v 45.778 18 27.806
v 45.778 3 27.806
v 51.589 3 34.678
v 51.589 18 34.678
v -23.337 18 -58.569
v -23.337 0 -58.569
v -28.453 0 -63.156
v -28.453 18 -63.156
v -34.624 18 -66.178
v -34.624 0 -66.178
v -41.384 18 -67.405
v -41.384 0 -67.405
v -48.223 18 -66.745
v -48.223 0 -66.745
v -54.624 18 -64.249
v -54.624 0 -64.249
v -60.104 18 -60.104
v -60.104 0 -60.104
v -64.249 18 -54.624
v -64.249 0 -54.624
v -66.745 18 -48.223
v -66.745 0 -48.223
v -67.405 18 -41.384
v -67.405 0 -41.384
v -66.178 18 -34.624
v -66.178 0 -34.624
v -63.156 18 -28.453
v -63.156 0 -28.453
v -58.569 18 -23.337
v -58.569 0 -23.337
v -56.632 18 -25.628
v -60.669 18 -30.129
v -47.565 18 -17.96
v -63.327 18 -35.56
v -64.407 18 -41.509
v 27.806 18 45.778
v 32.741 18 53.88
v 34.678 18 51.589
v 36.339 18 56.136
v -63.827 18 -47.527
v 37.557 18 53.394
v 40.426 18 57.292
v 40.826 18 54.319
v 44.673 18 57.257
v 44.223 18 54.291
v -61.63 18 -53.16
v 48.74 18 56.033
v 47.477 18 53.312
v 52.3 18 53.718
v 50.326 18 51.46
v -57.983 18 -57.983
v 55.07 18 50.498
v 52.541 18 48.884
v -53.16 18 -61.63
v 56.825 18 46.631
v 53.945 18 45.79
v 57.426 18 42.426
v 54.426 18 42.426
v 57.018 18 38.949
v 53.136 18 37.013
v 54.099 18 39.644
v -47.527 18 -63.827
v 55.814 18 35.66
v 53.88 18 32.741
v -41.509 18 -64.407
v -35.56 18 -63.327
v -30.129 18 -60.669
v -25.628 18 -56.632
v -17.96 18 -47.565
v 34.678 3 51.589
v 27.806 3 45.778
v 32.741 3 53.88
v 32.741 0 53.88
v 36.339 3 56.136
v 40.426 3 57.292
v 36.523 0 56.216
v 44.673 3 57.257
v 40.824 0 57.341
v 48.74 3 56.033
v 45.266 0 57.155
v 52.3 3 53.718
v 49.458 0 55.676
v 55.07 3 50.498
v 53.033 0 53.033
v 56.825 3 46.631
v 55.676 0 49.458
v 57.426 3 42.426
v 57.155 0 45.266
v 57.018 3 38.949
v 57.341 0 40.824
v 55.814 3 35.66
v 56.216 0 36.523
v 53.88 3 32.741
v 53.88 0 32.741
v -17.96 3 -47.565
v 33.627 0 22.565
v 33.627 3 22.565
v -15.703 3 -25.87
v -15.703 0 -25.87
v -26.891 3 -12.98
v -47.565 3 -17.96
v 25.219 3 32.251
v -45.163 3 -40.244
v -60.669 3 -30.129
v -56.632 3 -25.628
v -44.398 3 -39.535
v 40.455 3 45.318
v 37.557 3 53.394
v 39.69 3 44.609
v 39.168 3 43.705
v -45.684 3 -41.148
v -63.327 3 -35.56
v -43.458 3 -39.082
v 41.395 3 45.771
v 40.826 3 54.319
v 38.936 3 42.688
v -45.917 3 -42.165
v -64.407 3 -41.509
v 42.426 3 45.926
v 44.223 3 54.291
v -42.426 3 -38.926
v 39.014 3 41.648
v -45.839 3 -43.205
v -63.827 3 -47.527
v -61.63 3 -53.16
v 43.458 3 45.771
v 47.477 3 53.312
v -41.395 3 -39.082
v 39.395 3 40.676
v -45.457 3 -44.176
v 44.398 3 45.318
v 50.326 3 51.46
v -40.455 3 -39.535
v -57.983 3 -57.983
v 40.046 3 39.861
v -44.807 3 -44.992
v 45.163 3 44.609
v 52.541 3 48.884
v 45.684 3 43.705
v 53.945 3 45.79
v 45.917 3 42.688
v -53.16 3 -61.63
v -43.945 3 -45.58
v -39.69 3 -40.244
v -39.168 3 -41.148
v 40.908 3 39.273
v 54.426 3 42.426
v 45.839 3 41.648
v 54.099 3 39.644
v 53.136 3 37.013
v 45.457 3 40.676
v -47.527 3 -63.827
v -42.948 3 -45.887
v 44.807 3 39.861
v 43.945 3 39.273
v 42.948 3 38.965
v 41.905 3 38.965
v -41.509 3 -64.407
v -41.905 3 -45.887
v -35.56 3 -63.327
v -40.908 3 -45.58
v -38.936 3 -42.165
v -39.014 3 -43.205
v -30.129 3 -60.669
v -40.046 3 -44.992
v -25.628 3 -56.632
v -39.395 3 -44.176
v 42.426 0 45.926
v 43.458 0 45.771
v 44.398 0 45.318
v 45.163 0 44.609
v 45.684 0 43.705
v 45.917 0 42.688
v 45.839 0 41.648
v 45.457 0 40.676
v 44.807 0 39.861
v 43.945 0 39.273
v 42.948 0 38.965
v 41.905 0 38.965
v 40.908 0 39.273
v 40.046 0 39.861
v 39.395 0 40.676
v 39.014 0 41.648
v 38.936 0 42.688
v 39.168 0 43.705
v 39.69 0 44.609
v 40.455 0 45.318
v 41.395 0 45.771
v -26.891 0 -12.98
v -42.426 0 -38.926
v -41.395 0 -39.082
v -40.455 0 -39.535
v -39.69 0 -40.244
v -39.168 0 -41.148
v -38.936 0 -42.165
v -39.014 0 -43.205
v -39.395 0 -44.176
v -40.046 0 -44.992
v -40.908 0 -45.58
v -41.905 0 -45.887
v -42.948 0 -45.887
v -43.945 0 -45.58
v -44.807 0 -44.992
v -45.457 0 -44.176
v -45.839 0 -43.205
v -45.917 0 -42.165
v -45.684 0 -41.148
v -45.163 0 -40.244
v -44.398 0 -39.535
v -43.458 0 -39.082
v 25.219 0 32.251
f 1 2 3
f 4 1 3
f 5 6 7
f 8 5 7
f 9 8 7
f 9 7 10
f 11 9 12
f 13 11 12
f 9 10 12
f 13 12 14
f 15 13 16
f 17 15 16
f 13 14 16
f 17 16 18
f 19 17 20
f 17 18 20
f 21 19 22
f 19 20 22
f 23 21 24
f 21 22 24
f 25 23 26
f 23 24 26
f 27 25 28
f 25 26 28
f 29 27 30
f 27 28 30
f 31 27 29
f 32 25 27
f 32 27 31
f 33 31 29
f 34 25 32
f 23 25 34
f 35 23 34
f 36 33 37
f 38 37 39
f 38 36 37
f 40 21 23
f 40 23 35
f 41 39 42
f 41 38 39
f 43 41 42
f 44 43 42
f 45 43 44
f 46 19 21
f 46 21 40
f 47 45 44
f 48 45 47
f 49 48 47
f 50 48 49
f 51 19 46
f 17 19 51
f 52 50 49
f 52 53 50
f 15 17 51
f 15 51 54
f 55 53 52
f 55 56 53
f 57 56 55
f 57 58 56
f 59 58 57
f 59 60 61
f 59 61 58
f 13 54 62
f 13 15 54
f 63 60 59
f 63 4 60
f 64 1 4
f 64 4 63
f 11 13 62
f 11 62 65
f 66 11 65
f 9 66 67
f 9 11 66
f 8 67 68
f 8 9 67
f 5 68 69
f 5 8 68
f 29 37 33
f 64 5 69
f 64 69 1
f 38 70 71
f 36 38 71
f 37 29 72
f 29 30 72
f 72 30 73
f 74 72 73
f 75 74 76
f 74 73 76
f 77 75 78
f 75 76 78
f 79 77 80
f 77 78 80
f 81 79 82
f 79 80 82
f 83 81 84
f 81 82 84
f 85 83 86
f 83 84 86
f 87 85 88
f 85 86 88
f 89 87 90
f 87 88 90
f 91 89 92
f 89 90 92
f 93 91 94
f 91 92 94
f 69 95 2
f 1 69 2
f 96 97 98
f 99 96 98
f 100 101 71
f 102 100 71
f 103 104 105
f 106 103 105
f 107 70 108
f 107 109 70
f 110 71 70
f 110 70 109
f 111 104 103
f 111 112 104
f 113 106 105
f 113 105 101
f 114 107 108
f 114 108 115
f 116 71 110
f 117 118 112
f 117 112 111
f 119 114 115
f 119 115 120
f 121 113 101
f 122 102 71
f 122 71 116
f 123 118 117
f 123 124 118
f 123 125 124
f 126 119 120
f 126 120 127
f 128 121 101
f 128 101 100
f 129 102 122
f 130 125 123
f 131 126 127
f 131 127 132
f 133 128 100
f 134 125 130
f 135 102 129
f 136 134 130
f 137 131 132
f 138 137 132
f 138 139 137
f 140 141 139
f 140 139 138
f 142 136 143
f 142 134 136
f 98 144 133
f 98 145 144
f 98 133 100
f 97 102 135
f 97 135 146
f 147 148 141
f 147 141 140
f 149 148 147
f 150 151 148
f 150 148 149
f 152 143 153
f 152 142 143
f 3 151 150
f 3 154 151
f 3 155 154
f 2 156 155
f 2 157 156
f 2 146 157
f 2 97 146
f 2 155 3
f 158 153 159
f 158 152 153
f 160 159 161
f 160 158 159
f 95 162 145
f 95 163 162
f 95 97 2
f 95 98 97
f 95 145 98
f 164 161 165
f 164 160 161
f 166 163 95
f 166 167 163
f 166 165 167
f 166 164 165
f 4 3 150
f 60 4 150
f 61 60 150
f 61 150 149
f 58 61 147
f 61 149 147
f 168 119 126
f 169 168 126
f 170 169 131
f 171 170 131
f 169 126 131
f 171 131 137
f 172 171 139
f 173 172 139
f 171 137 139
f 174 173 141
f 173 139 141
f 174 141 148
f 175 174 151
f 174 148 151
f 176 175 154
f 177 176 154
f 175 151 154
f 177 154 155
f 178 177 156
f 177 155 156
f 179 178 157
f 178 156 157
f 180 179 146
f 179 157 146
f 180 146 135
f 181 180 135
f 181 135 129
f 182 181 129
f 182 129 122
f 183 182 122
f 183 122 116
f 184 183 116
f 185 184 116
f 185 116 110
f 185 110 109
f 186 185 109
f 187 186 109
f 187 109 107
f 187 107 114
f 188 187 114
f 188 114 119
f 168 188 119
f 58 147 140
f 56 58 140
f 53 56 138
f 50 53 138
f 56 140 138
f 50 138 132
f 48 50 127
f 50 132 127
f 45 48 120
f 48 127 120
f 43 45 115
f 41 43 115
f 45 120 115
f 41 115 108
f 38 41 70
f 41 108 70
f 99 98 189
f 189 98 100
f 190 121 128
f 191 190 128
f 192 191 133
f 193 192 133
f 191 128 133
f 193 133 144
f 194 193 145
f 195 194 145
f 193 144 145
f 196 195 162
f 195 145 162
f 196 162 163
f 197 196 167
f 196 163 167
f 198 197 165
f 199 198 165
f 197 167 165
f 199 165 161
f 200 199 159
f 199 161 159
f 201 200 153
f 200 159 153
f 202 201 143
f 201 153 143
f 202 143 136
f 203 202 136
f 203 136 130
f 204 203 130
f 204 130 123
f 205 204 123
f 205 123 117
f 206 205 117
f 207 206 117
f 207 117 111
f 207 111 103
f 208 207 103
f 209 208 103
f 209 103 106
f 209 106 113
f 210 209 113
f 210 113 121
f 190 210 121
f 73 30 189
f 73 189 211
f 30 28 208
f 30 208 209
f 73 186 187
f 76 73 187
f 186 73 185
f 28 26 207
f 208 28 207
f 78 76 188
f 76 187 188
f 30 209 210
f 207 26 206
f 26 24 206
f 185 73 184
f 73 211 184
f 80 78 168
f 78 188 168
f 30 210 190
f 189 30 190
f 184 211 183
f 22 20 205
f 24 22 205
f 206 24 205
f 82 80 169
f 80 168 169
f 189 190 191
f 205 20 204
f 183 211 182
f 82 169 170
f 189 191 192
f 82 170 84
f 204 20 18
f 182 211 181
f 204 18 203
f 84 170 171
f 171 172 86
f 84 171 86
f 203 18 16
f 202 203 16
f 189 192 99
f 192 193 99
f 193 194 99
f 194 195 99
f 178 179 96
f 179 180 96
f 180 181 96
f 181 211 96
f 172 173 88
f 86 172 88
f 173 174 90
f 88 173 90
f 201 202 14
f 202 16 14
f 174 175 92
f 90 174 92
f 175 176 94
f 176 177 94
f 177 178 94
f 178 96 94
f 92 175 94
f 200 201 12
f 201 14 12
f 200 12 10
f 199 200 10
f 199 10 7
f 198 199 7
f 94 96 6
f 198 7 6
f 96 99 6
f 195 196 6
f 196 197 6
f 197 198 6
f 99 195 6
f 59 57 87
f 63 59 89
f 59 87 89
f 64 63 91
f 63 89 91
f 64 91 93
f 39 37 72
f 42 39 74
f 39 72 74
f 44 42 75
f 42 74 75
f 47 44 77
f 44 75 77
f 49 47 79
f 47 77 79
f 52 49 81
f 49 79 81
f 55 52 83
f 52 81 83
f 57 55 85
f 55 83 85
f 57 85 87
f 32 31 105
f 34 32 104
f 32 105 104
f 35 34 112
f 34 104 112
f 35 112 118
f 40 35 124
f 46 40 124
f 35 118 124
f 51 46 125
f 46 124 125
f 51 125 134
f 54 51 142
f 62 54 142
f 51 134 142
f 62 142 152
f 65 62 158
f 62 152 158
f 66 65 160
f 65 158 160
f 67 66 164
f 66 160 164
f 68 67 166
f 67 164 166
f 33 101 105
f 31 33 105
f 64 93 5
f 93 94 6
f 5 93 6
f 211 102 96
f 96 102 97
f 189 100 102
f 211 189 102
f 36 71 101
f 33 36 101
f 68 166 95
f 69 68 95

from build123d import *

# Parameters (mm, degrees)
EXTRUDE_2_DEPTH     = 3
SKETCH_4_R          = 2.25
SKETCH_4_R_2        = 2.5
CUT_EXTRUDE_2_DEPTH = 96.402519291
SKETCH_6_R          = 3.5
CUT_EXTRUDE_3_DEPTH = 96.402519291
SKETCH_7_R          = 3.5
CUT_EXTRUDE_4_DEPTH = 96.402519291
CUT_EXTRUDE_5_DEPTH = 96.402519291
EXTRUDE_4_DEPTH     = 15


with BuildPart() as part:
    # 草图2 → 凸台-拉伸2 (new body)
    with BuildSketch(Plane(origin=(0, 0, 0), x_dir=(1, 0, 0), z_dir=(0, 1, 0))):
        with BuildLine():
            Line((-58.569449541, 23.337085947), (32.740581269, -53.879999426))
            ThreePointArc((32.740581269, -53.879999426), (53.033008589, -53.033008589), (53.879999426, -32.740581269))
            Line((53.879999426, -32.740581269), (-23.337085947, 58.569449541))
            ThreePointArc((-23.337085947, 58.569449541), (-60.104076401, 60.104076401), (-58.569449541, 23.337085947))
        make_face()
    extrude(amount=EXTRUDE_2_DEPTH)

    # 草图4 → 切除-拉伸2 (cut, through all)
    with BuildSketch(Plane(origin=(0, 3, 0), x_dir=(1, 0, 0), z_dir=(0, 1, 0))):
        with Locations(Location((-42.426406871, 42.426406871, 0), (0, 0, 270))):
            Circle(SKETCH_4_R)
        with Locations(Location((42.426406871, -42.426406871, 0), (0, 0, 270))):
            Circle(SKETCH_4_R_2)
    extrude(amount=-CUT_EXTRUDE_2_DEPTH, mode=Mode.SUBTRACT)

    # 草图6 → 切除-拉伸3 (cut, through all)
    with BuildSketch(Plane(origin=(0, 3, 0), x_dir=(1, 0, 0), z_dir=(0, 1, 0))):
        with Locations(Location((-42.426406871, 42.426406871, 0), (0, 0, 270))):
            Circle(SKETCH_6_R)
    extrude(amount=-CUT_EXTRUDE_3_DEPTH, mode=Mode.SUBTRACT)

    # 草图7 → 切除-拉伸4 (cut, through all)
    with BuildSketch(Plane(origin=(0, 3, 0), x_dir=(1, 0, 0), z_dir=(0, 1, 0))):
        with Locations(Location((42.426406871, -42.426406871, 0), (0, 0, 270))):
            Circle(SKETCH_7_R)
    extrude(amount=-CUT_EXTRUDE_4_DEPTH, mode=Mode.SUBTRACT)

    # 草图8 → 切除-拉伸5 (cut, through all)
    with BuildSketch(Plane(origin=(0, 3, 0), x_dir=(1, 0, 0), z_dir=(0, 1, 0))):
        Polygon((33.626672858, -22.564710472), (-15.702999665, 25.870376375), (-26.891422763, 12.98046534), (25.218843822, -32.251166492), align=None)
    extrude(amount=-CUT_EXTRUDE_5_DEPTH, mode=Mode.SUBTRACT)

    # 草图9 → 凸台-拉伸4 (add)
    with BuildSketch(Plane(origin=(0, 3, 0), x_dir=(1, 0, 0), z_dir=(0, 1, 0))):
        with BuildLine():
            ThreePointArc((-17.960284018, 47.565359346), (-19.96440182, 53.401757848), (-23.337085947, 58.569449541))
            ThreePointArc((-23.337085947, 58.569449541), (-60.104076401, 60.104076401), (-58.569449541, 23.337085947))
            ThreePointArc((-58.569449541, 23.337085947), (-53.401757848, 19.96440182), (-47.565359346, 17.960284018))
            Line((-47.565359346, 17.960284018), (-56.632284421, 25.627804458))
            ThreePointArc((-56.632284421, 25.627804458), (-57.982756057, 57.982756057), (-25.627804458, 56.632284421))
            Line((-25.627804458, 56.632284421), (-17.960284018, 47.565359346))
        make_face()
        with BuildLine():
            Line((53.879999426, -32.740581269), (-23.337085947, 58.569449541))
            ThreePointArc((-23.337085947, 58.569449541), (-19.96440182, 53.401757848), (-17.960284018, 47.565359346))
            Line((-17.960284018, 47.565359346), (45.777785554, -27.805590857))
            ThreePointArc((45.777785554, -27.805590857), (50.229311839, -29.615681908), (53.879999426, -32.740581269))
        make_face()
        with BuildLine():
            ThreePointArc((-47.565359346, 17.960284018), (-53.401757848, 19.96440182), (-58.569449541, 23.337085947))
            Line((-58.569449541, 23.337085947), (32.740581269, -53.879999426))
            ThreePointArc((32.740581269, -53.879999426), (29.615681908, -50.229311839), (27.805590857, -45.777785554))
            Line((27.805590857, -45.777785554), (-47.565359346, 17.960284018))
        make_face()
        with BuildLine():
            ThreePointArc((57.426406871, -42.426406871), (56.511929373, -37.26907657), (53.879999426, -32.740581269))
            ThreePointArc((53.879999426, -32.740581269), (50.229311839, -29.615681908), (45.777785554, -27.805590857))
            Line((45.777785554, -27.805590857), (51.589280915, -34.67774639))
            ThreePointArc((51.589280915, -34.67774639), (53.694824873, -38.30054263), (54.426406871, -42.426406871))
            ThreePointArc((54.426406871, -42.426406871), (47.47695507, -53.311808237), (34.67774639, -51.589280915))
            Line((34.67774639, -51.589280915), (27.805590857, -45.777785554))
            ThreePointArc((27.805590857, -45.777785554), (29.615681908, -50.229311839), (32.740581269, -53.879999426))
            ThreePointArc((32.740581269, -53.879999426), (48.73959212, -56.033158578), (57.426406871, -42.426406871))
        make_face()
    extrude(amount=EXTRUDE_4_DEPTH)


solid = part.part
